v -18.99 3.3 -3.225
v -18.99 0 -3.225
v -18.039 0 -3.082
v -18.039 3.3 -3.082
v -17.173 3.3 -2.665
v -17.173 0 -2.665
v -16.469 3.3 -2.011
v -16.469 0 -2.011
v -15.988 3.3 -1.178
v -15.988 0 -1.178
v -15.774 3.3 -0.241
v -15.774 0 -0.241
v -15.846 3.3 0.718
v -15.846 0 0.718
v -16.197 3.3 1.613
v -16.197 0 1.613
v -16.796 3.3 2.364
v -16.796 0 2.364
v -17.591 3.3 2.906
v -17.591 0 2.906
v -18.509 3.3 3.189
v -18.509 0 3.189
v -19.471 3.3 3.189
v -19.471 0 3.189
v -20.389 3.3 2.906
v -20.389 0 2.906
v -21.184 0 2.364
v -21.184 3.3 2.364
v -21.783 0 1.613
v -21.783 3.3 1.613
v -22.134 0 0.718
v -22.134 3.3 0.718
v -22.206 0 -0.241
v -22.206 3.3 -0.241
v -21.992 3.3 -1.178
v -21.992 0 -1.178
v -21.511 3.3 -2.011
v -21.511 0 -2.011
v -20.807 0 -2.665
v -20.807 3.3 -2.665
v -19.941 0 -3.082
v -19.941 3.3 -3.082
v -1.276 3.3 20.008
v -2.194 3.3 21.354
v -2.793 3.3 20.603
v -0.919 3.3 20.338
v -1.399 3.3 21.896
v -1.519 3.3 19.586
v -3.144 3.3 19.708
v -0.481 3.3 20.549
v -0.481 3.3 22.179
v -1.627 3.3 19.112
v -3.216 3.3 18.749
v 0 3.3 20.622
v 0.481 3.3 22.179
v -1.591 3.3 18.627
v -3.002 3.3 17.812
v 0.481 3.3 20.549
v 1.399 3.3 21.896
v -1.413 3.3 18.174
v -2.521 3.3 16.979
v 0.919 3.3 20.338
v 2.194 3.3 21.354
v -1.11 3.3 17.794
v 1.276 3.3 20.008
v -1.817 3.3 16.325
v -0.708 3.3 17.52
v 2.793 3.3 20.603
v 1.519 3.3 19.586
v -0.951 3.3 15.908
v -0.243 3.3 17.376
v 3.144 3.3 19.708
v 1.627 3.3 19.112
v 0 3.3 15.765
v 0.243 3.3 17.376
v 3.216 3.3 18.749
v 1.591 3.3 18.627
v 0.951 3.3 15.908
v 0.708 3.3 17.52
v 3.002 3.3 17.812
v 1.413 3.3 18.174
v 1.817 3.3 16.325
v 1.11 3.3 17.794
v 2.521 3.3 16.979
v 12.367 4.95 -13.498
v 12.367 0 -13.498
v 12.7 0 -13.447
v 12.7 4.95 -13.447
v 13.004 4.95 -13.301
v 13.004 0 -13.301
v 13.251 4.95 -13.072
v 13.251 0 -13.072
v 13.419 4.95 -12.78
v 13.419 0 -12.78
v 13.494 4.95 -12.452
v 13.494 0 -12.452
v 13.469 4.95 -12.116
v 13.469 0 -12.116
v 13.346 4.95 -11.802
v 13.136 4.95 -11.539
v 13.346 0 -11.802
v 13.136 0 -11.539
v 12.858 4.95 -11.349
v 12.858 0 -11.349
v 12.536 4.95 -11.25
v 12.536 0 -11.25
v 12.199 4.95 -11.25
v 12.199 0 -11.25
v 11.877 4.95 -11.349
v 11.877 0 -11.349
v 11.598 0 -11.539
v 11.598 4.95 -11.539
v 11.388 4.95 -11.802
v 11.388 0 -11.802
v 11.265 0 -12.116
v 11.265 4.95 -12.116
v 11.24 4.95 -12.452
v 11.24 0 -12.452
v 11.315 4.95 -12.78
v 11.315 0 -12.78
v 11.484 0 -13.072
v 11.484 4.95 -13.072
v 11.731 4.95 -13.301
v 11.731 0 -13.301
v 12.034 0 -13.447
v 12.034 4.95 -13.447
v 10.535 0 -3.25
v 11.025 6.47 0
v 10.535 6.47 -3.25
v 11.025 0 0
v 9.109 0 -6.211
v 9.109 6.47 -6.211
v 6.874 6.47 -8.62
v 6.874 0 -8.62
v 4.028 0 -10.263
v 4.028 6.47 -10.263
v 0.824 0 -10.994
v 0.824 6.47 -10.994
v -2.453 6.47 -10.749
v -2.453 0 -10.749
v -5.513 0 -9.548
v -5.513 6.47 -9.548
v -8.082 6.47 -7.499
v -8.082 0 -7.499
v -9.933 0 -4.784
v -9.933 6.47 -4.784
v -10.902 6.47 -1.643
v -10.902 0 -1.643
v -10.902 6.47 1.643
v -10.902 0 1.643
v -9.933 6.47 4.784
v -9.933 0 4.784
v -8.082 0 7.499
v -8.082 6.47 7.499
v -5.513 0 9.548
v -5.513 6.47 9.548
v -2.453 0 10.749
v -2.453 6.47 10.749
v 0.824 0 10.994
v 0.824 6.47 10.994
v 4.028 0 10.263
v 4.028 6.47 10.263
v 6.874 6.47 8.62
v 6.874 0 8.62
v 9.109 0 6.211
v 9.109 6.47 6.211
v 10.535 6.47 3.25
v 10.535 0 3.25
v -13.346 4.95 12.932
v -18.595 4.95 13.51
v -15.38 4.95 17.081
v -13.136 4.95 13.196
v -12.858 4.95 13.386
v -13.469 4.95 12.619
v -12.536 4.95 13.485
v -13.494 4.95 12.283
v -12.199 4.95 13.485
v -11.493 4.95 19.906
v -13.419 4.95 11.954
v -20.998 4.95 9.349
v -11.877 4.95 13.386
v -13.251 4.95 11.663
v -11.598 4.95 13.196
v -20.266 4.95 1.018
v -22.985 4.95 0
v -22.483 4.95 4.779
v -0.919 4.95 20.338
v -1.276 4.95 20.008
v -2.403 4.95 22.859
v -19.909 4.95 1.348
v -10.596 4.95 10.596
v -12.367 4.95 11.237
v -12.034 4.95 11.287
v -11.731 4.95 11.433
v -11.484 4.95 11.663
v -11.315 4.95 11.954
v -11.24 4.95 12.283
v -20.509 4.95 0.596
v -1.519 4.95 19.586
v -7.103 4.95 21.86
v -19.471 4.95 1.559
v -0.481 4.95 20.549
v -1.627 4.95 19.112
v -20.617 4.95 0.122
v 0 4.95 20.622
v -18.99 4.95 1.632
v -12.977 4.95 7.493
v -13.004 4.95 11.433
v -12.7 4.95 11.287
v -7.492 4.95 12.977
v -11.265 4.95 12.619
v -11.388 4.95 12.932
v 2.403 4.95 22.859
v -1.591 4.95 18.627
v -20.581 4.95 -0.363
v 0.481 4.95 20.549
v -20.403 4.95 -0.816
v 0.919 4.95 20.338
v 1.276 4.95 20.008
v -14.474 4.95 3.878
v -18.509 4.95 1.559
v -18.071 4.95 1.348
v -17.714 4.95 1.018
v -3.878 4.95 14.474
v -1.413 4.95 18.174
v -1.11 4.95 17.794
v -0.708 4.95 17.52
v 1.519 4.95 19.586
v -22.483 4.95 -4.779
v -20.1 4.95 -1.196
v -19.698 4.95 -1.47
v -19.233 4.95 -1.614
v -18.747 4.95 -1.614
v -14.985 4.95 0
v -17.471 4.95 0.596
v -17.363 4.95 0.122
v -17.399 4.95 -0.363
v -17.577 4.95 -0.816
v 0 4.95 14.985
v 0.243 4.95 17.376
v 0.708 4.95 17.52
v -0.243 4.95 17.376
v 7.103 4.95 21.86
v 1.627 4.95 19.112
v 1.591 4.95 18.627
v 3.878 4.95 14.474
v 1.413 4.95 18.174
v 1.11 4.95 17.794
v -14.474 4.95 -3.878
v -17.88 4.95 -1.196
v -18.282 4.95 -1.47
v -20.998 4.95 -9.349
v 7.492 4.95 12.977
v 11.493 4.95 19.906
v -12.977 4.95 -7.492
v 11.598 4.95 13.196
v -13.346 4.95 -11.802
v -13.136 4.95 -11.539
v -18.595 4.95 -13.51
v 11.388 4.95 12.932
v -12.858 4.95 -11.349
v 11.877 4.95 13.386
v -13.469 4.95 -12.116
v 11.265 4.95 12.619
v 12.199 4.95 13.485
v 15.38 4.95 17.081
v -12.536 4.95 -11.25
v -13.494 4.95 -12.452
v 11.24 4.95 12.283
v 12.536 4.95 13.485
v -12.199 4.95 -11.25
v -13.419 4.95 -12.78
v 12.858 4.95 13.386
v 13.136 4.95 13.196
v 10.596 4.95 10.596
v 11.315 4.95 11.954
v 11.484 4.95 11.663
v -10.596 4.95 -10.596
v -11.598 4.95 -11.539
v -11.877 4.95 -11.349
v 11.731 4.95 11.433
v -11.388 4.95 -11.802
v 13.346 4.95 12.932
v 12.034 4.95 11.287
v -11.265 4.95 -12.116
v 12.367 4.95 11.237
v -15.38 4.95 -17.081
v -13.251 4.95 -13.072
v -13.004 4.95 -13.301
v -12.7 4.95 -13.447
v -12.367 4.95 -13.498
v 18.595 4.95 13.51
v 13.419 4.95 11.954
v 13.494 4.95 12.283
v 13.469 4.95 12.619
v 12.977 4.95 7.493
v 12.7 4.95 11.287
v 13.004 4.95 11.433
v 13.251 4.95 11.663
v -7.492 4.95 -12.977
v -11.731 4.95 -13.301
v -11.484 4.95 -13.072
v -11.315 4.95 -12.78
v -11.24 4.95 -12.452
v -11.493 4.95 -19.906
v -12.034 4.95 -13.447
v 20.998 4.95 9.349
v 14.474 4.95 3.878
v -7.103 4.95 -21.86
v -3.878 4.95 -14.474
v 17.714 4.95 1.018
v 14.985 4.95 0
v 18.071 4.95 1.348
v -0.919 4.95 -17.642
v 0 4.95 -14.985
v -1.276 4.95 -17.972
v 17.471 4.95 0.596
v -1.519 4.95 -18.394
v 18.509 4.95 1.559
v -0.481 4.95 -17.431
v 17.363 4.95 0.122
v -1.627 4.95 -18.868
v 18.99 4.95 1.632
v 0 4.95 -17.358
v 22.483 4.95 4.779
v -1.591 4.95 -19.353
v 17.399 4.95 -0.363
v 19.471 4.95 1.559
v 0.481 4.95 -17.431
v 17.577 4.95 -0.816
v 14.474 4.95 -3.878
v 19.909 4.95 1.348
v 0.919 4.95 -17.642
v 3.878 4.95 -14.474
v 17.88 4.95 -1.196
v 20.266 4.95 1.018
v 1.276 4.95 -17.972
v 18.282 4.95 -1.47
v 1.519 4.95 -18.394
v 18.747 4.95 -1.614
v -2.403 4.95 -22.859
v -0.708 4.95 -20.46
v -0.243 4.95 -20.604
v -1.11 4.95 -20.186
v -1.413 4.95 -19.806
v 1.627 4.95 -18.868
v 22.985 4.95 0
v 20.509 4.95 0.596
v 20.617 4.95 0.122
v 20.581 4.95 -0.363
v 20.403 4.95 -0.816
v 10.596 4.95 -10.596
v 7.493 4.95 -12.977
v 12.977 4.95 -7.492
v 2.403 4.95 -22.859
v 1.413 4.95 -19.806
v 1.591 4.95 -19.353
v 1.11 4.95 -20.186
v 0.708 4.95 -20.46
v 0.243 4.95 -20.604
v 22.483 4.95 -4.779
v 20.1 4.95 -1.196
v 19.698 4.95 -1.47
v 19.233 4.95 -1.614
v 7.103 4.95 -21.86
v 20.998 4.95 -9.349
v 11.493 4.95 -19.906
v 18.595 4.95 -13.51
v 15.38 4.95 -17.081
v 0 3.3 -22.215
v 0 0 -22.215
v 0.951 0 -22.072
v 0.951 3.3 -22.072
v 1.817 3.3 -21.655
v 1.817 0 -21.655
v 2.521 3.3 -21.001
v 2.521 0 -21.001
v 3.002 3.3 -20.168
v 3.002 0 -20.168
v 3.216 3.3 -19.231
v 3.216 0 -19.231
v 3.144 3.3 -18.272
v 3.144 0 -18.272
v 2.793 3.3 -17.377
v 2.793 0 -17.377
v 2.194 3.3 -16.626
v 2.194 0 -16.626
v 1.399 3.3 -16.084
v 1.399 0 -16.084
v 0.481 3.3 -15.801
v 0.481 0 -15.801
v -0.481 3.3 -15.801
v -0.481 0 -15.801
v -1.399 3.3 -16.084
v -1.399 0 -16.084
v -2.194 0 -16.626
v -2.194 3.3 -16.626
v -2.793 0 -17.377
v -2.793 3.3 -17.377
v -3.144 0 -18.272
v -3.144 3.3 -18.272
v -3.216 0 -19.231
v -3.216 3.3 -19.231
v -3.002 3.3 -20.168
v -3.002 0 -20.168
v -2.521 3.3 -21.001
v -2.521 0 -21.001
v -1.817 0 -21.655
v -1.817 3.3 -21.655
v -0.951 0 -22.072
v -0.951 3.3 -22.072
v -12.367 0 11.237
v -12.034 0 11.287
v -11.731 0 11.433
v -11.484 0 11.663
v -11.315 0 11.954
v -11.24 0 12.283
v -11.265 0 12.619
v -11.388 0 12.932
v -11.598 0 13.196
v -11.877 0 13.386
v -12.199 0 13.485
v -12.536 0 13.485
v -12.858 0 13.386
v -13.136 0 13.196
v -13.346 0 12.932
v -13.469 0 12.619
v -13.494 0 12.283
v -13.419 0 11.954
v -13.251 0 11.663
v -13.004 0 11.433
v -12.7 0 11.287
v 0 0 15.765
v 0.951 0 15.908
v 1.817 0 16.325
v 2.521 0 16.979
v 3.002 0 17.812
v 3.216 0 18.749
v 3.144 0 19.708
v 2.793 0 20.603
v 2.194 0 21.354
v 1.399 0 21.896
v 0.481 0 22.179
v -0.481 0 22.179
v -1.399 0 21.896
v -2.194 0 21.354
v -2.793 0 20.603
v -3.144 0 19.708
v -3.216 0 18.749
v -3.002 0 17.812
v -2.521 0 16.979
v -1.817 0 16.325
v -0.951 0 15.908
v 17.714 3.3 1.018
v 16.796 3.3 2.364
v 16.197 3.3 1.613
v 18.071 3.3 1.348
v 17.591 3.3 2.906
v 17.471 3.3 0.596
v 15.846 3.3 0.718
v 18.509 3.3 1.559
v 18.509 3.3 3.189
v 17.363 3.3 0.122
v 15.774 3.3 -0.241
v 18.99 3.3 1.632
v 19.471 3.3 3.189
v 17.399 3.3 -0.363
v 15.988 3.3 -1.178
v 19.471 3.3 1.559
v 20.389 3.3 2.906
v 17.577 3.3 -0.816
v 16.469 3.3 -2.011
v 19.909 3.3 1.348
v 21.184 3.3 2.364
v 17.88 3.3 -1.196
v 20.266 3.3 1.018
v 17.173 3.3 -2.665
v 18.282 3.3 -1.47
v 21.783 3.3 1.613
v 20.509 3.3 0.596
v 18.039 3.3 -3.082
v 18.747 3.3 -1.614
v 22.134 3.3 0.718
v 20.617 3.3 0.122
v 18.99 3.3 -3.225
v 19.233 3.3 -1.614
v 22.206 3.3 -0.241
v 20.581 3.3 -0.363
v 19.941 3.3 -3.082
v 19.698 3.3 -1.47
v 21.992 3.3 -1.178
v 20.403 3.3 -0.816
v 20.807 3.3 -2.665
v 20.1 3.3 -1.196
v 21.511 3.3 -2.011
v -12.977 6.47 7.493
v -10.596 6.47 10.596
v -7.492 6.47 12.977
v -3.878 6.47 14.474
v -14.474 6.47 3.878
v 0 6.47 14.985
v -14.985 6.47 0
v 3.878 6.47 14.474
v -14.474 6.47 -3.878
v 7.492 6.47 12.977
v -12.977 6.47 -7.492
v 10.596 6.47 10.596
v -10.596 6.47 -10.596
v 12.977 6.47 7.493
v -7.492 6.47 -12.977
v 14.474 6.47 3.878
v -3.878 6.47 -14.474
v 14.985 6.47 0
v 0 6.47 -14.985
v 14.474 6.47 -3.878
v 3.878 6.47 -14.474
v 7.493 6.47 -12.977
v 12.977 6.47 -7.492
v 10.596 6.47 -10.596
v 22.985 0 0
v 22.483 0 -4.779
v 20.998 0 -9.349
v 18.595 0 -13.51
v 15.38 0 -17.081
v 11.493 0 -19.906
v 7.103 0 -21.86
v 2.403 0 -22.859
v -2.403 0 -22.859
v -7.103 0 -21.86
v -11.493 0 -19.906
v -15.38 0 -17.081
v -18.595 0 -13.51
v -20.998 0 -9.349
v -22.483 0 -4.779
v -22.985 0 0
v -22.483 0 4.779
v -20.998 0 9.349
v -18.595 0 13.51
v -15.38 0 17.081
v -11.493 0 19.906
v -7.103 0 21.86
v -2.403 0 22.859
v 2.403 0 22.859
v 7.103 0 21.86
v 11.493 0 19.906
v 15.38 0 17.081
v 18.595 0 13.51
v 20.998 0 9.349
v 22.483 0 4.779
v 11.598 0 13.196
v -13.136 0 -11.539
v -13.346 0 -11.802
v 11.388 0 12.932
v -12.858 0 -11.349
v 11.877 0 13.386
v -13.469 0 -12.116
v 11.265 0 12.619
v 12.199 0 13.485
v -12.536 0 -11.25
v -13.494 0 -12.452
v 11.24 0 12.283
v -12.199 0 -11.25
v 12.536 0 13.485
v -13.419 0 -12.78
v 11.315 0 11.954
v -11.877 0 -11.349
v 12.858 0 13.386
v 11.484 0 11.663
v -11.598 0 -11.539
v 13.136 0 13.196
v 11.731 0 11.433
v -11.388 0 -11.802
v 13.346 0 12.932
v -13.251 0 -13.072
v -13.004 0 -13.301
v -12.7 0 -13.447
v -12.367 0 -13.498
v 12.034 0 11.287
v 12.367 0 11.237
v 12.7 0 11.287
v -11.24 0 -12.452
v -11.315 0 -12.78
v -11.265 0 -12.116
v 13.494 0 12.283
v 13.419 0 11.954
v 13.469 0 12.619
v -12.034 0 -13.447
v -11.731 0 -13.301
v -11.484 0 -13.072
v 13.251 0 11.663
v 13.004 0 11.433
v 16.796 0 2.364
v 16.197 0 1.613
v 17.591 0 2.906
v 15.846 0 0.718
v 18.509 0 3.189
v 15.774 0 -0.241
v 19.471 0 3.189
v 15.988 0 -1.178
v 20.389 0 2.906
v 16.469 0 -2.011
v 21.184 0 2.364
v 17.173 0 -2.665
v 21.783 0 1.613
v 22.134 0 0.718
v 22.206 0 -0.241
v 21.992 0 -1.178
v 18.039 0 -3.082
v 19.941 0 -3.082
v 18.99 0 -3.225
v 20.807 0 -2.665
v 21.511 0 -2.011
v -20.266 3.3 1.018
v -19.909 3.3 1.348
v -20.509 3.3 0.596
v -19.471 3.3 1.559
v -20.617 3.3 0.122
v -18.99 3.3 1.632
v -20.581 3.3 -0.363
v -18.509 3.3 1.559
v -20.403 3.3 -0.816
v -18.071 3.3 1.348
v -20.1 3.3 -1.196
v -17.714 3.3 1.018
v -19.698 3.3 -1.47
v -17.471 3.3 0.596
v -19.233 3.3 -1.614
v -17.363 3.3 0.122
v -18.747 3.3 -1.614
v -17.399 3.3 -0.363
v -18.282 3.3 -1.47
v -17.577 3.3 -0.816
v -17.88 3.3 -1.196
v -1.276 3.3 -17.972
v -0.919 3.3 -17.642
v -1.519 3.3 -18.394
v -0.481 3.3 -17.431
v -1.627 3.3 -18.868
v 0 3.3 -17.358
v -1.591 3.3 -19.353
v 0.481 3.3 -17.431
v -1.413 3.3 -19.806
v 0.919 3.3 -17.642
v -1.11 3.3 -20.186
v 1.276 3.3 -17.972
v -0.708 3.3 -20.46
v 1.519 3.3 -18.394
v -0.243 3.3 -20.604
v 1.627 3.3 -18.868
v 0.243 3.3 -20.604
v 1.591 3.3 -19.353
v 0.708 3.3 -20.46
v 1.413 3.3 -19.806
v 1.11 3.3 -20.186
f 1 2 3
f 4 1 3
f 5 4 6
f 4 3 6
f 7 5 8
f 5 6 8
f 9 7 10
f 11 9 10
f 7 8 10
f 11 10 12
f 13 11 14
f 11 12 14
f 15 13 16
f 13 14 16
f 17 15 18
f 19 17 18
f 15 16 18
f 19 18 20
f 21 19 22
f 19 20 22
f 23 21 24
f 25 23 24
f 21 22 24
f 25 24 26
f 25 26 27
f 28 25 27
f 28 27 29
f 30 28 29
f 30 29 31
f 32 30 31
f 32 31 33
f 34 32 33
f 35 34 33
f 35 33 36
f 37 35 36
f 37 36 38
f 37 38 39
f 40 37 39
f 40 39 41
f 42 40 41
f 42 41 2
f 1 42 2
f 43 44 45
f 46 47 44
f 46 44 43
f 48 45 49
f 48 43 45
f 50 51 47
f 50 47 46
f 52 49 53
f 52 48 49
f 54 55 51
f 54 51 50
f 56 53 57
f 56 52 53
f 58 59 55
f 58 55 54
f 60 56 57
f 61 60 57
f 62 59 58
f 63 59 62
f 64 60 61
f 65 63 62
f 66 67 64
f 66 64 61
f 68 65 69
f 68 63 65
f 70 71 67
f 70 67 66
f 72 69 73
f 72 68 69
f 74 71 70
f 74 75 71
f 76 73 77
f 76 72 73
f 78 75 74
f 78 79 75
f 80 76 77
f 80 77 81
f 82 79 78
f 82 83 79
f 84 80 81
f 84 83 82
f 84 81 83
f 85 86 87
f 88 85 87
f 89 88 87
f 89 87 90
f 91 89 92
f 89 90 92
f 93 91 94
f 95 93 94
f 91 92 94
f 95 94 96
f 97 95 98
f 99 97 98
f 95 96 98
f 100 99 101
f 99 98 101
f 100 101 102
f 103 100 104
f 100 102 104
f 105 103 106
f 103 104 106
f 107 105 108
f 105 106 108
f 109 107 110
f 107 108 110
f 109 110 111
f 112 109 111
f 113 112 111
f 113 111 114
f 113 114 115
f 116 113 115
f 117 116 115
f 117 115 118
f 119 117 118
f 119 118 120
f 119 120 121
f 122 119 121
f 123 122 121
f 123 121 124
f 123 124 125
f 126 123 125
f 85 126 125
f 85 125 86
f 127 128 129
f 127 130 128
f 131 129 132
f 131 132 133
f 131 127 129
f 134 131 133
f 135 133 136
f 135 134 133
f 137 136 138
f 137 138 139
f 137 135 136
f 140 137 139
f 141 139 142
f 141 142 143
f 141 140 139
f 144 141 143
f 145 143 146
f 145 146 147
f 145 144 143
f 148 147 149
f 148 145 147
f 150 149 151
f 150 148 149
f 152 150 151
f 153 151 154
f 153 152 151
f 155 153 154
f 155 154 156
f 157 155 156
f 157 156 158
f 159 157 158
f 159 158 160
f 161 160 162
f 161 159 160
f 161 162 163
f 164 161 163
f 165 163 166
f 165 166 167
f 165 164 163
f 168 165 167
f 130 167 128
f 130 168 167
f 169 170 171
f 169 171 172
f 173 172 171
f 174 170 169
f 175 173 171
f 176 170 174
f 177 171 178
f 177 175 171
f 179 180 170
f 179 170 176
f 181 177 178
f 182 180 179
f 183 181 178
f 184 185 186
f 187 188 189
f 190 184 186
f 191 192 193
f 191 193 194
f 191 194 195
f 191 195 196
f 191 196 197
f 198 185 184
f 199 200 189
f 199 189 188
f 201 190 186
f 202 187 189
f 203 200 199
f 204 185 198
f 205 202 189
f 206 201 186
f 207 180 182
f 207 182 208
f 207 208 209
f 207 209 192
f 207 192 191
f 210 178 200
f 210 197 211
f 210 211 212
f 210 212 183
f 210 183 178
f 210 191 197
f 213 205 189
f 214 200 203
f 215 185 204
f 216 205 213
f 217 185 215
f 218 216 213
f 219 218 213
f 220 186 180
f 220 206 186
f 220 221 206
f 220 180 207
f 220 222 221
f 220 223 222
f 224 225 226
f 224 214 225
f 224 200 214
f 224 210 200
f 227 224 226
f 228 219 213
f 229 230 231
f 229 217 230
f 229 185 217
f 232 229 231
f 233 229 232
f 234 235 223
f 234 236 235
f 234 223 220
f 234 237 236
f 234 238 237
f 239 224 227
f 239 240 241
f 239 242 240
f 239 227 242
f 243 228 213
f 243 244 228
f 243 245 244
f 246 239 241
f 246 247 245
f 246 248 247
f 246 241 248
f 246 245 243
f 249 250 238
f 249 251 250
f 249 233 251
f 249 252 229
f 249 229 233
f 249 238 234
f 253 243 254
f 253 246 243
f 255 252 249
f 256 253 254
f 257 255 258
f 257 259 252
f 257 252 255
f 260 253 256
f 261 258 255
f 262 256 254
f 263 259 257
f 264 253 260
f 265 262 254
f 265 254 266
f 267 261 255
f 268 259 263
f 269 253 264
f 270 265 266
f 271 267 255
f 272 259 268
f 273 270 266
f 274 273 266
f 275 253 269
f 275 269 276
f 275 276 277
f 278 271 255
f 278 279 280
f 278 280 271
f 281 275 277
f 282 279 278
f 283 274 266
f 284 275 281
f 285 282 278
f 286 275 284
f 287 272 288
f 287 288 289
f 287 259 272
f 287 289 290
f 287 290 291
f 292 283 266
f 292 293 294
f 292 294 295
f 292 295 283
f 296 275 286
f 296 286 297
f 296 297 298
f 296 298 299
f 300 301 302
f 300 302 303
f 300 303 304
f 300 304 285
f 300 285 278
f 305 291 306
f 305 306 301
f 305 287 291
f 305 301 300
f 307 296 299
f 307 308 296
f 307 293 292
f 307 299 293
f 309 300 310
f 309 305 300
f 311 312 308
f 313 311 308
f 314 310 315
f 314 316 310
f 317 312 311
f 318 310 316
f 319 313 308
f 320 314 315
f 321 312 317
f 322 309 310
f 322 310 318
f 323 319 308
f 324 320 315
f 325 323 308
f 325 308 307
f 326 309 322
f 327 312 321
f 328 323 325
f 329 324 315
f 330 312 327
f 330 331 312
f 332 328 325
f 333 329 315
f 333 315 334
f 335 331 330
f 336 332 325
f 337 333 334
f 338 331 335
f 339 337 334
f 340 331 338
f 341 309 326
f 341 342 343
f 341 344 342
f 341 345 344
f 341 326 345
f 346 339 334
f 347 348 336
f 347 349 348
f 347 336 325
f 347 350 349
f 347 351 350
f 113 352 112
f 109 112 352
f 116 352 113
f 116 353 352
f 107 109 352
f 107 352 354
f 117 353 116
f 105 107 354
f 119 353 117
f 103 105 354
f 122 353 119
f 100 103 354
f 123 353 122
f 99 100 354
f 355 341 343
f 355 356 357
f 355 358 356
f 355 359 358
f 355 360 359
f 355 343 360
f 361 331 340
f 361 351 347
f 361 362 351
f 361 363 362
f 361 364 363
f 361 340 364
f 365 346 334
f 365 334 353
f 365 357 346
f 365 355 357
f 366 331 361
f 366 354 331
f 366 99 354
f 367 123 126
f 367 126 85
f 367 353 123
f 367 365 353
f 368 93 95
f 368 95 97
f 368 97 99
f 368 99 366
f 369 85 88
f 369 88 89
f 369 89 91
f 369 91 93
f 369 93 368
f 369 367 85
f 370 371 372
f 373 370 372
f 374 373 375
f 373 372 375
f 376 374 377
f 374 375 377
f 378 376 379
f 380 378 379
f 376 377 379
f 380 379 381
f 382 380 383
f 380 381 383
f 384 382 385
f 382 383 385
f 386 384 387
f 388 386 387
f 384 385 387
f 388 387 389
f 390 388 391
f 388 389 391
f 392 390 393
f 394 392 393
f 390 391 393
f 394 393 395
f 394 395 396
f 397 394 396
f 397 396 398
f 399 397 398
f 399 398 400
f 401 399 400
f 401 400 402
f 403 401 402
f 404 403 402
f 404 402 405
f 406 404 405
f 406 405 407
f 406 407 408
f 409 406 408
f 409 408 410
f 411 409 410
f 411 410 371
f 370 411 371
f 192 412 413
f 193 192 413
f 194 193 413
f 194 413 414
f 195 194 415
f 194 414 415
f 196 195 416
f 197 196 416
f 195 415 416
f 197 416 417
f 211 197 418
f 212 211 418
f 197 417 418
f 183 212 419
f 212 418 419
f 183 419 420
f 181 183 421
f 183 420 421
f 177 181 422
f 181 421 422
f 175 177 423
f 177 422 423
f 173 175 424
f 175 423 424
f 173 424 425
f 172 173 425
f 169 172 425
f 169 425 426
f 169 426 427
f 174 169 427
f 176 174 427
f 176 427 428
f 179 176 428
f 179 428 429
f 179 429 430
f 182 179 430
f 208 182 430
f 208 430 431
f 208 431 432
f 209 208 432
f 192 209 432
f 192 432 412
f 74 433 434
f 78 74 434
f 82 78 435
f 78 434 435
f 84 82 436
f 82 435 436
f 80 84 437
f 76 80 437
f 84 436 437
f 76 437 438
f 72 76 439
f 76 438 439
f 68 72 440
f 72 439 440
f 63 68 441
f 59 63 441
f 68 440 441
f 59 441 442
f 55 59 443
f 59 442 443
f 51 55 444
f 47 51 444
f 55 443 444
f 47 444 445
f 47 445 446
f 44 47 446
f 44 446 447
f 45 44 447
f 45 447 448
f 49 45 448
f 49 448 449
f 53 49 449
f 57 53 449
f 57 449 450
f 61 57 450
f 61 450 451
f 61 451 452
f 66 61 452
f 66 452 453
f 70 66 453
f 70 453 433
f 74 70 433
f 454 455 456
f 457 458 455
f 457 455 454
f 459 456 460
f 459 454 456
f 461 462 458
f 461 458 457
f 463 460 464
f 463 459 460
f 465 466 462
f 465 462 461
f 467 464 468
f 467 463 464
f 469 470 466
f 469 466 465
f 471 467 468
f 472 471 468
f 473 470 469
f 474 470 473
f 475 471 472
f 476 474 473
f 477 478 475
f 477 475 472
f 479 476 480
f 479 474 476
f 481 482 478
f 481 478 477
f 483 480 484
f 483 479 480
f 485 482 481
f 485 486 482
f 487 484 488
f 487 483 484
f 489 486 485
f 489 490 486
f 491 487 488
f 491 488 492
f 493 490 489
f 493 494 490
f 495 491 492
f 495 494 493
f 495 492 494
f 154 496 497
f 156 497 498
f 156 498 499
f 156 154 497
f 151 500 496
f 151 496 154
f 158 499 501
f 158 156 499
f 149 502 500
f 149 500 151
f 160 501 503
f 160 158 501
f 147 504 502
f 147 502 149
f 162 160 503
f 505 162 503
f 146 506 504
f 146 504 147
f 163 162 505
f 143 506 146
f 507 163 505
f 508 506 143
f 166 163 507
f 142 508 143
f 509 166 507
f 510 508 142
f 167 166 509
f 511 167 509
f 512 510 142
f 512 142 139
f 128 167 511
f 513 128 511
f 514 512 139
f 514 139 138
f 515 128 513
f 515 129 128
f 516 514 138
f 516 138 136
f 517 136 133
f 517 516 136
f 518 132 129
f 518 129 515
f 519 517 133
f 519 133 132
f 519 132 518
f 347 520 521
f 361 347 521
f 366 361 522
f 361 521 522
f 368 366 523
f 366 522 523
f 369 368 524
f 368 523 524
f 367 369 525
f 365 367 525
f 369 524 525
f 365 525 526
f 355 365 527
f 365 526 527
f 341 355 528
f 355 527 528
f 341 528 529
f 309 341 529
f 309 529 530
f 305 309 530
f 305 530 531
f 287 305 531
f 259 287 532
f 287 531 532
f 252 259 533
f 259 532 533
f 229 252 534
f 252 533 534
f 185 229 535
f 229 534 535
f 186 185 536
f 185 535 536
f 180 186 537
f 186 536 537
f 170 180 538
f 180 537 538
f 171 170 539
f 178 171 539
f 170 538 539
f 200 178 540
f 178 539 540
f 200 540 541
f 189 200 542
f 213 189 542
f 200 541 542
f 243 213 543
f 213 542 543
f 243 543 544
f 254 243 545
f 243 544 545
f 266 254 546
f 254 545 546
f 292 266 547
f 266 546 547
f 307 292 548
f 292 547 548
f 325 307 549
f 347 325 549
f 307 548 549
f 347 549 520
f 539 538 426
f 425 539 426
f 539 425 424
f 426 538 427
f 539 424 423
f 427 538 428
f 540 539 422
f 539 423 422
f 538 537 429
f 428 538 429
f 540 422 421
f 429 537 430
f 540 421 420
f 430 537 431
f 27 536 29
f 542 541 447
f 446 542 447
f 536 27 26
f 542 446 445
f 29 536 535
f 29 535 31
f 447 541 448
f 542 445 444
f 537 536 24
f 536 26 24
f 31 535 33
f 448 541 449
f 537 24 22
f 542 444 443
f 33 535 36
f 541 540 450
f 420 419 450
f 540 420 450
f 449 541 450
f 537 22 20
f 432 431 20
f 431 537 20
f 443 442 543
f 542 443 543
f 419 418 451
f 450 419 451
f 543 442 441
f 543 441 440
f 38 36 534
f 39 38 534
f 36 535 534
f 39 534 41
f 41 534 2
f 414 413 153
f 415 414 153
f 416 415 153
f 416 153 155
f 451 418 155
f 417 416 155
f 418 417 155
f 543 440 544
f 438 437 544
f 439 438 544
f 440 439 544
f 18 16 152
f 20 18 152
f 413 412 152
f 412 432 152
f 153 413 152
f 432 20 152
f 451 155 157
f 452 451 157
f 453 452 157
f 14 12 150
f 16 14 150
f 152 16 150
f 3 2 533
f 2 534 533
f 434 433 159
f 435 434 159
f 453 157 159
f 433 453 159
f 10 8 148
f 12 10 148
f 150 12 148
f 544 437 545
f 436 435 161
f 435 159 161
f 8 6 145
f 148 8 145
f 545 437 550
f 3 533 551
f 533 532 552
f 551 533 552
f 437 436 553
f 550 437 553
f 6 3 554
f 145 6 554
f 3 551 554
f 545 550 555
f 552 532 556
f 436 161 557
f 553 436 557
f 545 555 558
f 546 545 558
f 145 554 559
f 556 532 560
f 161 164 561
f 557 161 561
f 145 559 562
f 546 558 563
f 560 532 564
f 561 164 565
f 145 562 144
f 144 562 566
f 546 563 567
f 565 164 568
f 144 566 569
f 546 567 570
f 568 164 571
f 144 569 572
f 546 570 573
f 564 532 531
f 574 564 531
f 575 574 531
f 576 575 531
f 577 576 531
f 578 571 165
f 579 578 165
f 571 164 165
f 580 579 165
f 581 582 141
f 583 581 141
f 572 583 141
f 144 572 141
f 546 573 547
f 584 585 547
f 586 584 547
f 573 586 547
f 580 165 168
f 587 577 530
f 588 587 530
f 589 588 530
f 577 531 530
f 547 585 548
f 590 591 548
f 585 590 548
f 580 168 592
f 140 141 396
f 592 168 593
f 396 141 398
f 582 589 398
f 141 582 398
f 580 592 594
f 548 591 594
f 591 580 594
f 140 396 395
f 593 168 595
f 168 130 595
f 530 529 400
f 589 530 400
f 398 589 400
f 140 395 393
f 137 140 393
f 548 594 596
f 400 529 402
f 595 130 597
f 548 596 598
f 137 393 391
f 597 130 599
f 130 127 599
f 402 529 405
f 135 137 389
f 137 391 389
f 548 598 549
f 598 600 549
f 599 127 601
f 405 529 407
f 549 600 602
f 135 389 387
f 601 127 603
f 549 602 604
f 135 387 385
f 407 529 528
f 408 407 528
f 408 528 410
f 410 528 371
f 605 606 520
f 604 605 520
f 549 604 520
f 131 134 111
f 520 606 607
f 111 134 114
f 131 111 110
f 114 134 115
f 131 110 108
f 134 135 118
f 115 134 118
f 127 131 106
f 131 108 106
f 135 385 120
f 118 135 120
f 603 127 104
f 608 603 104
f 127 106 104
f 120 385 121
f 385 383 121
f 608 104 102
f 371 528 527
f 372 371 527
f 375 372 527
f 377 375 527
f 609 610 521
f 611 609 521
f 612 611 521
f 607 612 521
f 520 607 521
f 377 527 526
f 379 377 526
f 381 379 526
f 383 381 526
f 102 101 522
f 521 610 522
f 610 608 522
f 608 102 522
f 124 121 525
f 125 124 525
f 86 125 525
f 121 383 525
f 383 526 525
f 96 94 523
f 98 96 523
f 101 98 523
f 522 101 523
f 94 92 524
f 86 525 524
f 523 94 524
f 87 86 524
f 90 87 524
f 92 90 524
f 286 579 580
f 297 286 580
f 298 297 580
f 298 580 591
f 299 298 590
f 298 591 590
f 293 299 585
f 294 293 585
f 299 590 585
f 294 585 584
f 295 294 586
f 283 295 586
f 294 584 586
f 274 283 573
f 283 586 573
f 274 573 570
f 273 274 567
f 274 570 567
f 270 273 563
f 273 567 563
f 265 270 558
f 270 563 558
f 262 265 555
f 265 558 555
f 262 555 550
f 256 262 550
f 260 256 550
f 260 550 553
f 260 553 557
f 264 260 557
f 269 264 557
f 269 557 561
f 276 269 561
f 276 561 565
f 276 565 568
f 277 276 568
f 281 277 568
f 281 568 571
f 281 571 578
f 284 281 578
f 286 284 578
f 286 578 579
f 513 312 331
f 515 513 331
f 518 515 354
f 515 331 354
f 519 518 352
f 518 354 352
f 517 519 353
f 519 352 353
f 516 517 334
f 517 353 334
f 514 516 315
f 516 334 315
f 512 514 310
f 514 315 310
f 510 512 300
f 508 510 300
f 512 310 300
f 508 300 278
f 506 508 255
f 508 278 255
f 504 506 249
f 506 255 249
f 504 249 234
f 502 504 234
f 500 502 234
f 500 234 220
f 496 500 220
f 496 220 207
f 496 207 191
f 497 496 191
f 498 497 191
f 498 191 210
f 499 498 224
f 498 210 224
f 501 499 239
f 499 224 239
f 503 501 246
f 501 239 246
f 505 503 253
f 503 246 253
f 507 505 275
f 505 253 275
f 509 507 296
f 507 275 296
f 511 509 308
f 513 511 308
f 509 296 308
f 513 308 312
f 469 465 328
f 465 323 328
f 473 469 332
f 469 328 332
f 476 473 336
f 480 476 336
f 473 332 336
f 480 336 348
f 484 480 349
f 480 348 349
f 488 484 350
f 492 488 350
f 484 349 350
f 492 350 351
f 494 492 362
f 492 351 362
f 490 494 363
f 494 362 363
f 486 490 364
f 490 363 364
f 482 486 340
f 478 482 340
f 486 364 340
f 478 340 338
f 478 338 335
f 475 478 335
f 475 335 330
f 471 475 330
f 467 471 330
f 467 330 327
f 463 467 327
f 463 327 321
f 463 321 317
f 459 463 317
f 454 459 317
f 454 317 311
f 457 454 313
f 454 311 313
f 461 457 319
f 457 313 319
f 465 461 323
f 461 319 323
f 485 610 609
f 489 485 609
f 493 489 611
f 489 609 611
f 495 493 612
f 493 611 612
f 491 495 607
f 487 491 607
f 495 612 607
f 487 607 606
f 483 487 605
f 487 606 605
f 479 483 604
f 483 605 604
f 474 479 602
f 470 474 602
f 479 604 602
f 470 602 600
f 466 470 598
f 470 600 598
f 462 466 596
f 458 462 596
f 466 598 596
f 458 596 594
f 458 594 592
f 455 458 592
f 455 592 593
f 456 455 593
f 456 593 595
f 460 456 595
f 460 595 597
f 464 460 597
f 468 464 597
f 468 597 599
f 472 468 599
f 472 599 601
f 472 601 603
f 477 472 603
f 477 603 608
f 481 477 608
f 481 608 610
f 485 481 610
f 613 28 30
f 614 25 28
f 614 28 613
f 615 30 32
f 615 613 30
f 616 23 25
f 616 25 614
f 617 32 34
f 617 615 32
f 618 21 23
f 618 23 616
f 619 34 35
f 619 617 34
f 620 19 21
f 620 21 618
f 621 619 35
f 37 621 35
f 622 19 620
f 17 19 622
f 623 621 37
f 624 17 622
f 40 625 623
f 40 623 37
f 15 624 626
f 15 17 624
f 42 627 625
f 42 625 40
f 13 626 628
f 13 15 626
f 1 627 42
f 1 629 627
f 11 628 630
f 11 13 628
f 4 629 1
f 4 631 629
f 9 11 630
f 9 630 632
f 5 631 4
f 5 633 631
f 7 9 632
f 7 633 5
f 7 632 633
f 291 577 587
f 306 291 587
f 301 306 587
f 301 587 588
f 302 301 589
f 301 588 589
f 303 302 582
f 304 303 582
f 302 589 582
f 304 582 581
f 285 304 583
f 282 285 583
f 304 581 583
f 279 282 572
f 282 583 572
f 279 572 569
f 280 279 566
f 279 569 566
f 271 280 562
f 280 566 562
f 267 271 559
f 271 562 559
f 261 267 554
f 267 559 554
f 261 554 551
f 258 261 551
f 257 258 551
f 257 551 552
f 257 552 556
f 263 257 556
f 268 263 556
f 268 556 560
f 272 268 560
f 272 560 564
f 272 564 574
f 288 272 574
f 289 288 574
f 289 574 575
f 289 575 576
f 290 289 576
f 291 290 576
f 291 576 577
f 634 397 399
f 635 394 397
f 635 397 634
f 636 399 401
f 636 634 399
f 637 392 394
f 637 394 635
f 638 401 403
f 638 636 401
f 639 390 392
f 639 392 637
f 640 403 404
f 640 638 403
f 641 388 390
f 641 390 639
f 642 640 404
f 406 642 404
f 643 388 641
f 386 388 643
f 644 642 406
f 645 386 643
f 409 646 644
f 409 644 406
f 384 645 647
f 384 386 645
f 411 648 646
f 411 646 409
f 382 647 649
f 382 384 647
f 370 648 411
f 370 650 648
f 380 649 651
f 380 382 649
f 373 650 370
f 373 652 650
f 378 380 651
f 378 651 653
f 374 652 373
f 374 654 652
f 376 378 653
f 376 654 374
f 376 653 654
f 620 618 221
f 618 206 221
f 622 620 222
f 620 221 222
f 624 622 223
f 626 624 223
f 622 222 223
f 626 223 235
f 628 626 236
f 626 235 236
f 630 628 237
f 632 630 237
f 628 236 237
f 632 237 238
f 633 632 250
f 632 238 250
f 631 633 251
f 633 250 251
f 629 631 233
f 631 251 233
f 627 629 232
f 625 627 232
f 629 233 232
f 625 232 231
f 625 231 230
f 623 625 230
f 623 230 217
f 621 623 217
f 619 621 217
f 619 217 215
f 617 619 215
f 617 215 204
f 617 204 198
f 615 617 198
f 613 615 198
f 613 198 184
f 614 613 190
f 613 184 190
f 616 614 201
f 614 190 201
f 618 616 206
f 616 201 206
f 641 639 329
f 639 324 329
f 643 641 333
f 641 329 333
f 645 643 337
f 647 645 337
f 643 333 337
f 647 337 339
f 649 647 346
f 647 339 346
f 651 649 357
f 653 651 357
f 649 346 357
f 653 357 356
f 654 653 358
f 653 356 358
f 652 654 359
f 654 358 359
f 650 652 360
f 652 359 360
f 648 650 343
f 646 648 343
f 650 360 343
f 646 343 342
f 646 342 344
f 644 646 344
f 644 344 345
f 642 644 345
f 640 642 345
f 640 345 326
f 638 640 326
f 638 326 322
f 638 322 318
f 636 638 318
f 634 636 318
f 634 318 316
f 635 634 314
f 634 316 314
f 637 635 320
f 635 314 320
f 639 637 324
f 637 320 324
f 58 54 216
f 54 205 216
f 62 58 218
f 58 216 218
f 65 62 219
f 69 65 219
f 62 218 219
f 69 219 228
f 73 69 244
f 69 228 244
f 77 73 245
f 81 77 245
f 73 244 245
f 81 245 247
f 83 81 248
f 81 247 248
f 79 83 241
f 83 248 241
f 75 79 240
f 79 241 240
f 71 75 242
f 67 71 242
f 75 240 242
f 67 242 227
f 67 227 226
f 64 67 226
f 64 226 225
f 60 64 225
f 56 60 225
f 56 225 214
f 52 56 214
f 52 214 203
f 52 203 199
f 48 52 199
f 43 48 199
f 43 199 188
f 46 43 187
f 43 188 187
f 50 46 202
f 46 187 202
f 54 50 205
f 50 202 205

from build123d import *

# Parameters (mm, degrees)
SKETCH2_R                                      = 22.985
SKETCH2_R_2                                    = 1.63
SKETCH2_R_3                                    = 1.13
SKETCH2_R_4                                    = 14.985
SKETCH2_R_5                                    = 11.025
BOSS_EXTRUDE1_DEPTH                            = 4.95
BOSS_EXTRUDE2_START                            = 4.95
SKETCH2_3_R                                    = 14.985
SKETCH2_3_R_2                                  = 11.025
BOSS_EXTRUDE2_DEPTH                            = 1.52
F_4_40_TAPPED_HOLE1_D                          = 2.2606
CBORE_FOR_4_SOCKET_HEAD_CAP_SCREW1_D           = 3.2639
CBORE_FOR_4_SOCKET_HEAD_CAP_SCREW1_CBORE_D     = 6.450000054
CBORE_FOR_4_SOCKET_HEAD_CAP_SCREW1_CBORE_DEPTH = 3.300000004


with BuildPart() as part:
    # Sketch2 → Boss-Extrude1 (new body)
    with BuildSketch(Plane(origin=(0, 0, 0), x_dir=(1, 0, 0), z_dir=(0, 1, 0))):
        Circle(SKETCH2_R)
        with Locations((-18.99, 0)):
            Circle(SKETCH2_R_2, mode=Mode.SUBTRACT)
        with Locations((0, -18.99)):
            Circle(SKETCH2_R_2, mode=Mode.SUBTRACT)
        with Locations((18.99, 0)):
            Circle(SKETCH2_R_2, mode=Mode.SUBTRACT)
        with Locations((0, 18.99)):
            Circle(SKETCH2_R_2, mode=Mode.SUBTRACT)
        with Locations((12.367297603, -12.367297603)):
            Circle(SKETCH2_R_3, mode=Mode.SUBTRACT)
        with Locations((-12.367297603, -12.367297603)):
            Circle(SKETCH2_R_3, mode=Mode.SUBTRACT)
        with Locations((12.367297603, 12.367297603)):
            Circle(SKETCH2_R_3, mode=Mode.SUBTRACT)
        with Locations((-12.367297603, 12.367297603)):
            Circle(SKETCH2_R_3, mode=Mode.SUBTRACT)
        Circle(SKETCH2_R_4, mode=Mode.SUBTRACT)
        Circle(SKETCH2_R_4)
        Circle(SKETCH2_R_5, mode=Mode.SUBTRACT)
    extrude(amount=BOSS_EXTRUDE1_DEPTH)

    # Sketch2<3> → Boss-Extrude2 (add)
    with BuildSketch(Plane(origin=(0, 0, 0), x_dir=(1, 0, 0), z_dir=(0, 1, 0)).offset(BOSS_EXTRUDE2_START)):
        Circle(SKETCH2_3_R)
        Circle(SKETCH2_3_R_2, mode=Mode.SUBTRACT)
    extrude(amount=BOSS_EXTRUDE2_DEPTH)

    # #4-40 Tapped Hole1 (through all)
    with Locations(Plane(origin=(12.367297603, 4.95, -12.367297603), x_dir=(0, 0, 1), z_dir=(0, 1, 0))):
        with Locations((0, 0), (24.734595206, 0), (24.734595206, -24.734595206), (0, -24.734595206)):
            Hole(F_4_40_TAPPED_HOLE1_D / 2)

    # CBORE for #4 Socket Head Cap Screw1 (through all)
    with Locations(Plane(origin=(0, 0, 18.99), x_dir=(0, 0, -1), z_dir=(0, -1, 0))):
        with Locations((0, 0), (18.99, 18.99), (37.98, 0), (18.99, -18.99)):
            CounterBoreHole(CBORE_FOR_4_SOCKET_HEAD_CAP_SCREW1_D / 2, CBORE_FOR_4_SOCKET_HEAD_CAP_SCREW1_CBORE_D / 2, CBORE_FOR_4_SOCKET_HEAD_CAP_SCREW1_CBORE_DEPTH)


solid = part.part
